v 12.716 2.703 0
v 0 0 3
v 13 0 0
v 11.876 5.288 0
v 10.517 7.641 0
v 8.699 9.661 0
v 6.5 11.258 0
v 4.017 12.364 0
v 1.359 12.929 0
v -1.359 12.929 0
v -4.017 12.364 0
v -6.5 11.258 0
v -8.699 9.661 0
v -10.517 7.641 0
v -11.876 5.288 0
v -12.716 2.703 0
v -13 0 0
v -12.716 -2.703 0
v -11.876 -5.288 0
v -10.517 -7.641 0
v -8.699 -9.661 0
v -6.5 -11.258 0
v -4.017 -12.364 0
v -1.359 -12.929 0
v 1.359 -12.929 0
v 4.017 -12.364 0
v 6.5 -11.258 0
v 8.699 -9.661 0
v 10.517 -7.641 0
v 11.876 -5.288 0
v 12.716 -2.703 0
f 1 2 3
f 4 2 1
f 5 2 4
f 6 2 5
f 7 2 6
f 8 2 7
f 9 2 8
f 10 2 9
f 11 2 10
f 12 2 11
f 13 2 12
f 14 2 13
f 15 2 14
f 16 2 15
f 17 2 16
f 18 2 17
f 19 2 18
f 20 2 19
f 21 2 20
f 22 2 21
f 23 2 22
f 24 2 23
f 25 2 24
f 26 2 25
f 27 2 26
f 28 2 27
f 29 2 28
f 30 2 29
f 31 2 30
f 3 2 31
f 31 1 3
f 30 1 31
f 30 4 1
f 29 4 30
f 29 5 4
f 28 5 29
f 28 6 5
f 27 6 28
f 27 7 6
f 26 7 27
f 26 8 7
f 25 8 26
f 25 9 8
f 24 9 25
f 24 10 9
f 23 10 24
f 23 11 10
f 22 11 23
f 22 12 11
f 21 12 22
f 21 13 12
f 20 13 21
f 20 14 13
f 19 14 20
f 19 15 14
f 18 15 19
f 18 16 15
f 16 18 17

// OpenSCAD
// Generated by SolidPython 1.0.1 on 2020-07-29 00:46:43


cylinder(h = 3, r1 = 13, r2 = 0);
/***********************************************
*********      SolidPython code:      **********
************************************************
 
# import packages: SolidPython
from solid import *
from solid.utils import *
from itertools import chain, combinations, permutations


class Resize:

    def __init__(self, scad_file):
        self.scad_file = scad_file
        #self.scad_file = import_scad(scad_file)
        # cone/cylinder param:
        self.r1 = 0
        self.r2 = 0
        self.h = 0
        # rectangular prism param:
        self.w = 0
        self.l = 0
        # ellipse param:
        self.r = 0

    # import OpenScad code (file name corresponds to shape)


    # classify shape + parameters
    def assign(self, param1, param2, param3):
        if self.scad_file == 'cone.scad':
            self.r1 = param1
            self.r2 = param2
            self.h = param3
        elif self.scad_file == 'cylinder.scad':
            self.r1 = param1
            self.r2 = param2
            self.h = param3
        elif self.scad_file == 'rectangularPrism.scad':
            self.h = param1
            self.l = param2
            self.w = param3
        else:
            self.r = param1
            self.h = param2

    # resize parameters
    def iterate(self):
        x = range(3, 20, 2)
        i = 1
        if self.scad_file == 'cone.scad':
            tempList = list(permutations(x, 2))
            for temp in tempList:
                param1 = temp[0]
                param2 = temp[1]
                filepath = 'produced_scad_files/' + 'cone' + str(param1) + '_' + str(param2) + '_' + '.scad'
                scad_render_to_file(cylinder(h=param1, r1=param2, r2=0), filepath)

        elif self.scad_file == 'cylinder.scad':
            tempList = list(permutations(x, 3))
            for temp in tempList:
                param1 = temp[0]
                param2 = temp[1]
                filepath = 'produced_scad_files/' + 'cylinder' + str(param1) + '_' + str(param2) + '_' + '.scad'
                scad_render_to_file(cylinder(h=param1, r1=param2, r2=param2), filepath)

        elif self.scad_file == 'rectangularPrism.scad':
            tempList = list(permutations(x, 3))
            for temp in tempList:
                param1 = temp[0]
                param2 = temp[1]
                param3 = temp[2]
                filepath = 'produced_scad_files/' + 'rectangularPrism' + str(param1) + '_' + str(param2) + '_' + str(
                    param3) + '.scad'
                scad_render_to_file(cube(size=(param1, param2, param3)), filepath)

        elif self.scad_file == 'ellipse.scad':
            tempList = list(permutations(x, 4))
            for temp in tempList:
                param1 = temp[0]
                param2 = temp[1]
                param3 = temp[2]
                param4 = temp[3]
                filepath = 'produced_scad_files/' + 'ellipse' + str(param1) + '_' + str(param2) + '_' + str(param3) + '_' + str(param4) + '.scad'
                scad_render_to_file(scale([param1, param2, param3])(sphere(r=param4)), filepath)

    def render_to_scadfile(self):
        scad_render_to_file(scad, 'example.scad') 
 
************************************************/
